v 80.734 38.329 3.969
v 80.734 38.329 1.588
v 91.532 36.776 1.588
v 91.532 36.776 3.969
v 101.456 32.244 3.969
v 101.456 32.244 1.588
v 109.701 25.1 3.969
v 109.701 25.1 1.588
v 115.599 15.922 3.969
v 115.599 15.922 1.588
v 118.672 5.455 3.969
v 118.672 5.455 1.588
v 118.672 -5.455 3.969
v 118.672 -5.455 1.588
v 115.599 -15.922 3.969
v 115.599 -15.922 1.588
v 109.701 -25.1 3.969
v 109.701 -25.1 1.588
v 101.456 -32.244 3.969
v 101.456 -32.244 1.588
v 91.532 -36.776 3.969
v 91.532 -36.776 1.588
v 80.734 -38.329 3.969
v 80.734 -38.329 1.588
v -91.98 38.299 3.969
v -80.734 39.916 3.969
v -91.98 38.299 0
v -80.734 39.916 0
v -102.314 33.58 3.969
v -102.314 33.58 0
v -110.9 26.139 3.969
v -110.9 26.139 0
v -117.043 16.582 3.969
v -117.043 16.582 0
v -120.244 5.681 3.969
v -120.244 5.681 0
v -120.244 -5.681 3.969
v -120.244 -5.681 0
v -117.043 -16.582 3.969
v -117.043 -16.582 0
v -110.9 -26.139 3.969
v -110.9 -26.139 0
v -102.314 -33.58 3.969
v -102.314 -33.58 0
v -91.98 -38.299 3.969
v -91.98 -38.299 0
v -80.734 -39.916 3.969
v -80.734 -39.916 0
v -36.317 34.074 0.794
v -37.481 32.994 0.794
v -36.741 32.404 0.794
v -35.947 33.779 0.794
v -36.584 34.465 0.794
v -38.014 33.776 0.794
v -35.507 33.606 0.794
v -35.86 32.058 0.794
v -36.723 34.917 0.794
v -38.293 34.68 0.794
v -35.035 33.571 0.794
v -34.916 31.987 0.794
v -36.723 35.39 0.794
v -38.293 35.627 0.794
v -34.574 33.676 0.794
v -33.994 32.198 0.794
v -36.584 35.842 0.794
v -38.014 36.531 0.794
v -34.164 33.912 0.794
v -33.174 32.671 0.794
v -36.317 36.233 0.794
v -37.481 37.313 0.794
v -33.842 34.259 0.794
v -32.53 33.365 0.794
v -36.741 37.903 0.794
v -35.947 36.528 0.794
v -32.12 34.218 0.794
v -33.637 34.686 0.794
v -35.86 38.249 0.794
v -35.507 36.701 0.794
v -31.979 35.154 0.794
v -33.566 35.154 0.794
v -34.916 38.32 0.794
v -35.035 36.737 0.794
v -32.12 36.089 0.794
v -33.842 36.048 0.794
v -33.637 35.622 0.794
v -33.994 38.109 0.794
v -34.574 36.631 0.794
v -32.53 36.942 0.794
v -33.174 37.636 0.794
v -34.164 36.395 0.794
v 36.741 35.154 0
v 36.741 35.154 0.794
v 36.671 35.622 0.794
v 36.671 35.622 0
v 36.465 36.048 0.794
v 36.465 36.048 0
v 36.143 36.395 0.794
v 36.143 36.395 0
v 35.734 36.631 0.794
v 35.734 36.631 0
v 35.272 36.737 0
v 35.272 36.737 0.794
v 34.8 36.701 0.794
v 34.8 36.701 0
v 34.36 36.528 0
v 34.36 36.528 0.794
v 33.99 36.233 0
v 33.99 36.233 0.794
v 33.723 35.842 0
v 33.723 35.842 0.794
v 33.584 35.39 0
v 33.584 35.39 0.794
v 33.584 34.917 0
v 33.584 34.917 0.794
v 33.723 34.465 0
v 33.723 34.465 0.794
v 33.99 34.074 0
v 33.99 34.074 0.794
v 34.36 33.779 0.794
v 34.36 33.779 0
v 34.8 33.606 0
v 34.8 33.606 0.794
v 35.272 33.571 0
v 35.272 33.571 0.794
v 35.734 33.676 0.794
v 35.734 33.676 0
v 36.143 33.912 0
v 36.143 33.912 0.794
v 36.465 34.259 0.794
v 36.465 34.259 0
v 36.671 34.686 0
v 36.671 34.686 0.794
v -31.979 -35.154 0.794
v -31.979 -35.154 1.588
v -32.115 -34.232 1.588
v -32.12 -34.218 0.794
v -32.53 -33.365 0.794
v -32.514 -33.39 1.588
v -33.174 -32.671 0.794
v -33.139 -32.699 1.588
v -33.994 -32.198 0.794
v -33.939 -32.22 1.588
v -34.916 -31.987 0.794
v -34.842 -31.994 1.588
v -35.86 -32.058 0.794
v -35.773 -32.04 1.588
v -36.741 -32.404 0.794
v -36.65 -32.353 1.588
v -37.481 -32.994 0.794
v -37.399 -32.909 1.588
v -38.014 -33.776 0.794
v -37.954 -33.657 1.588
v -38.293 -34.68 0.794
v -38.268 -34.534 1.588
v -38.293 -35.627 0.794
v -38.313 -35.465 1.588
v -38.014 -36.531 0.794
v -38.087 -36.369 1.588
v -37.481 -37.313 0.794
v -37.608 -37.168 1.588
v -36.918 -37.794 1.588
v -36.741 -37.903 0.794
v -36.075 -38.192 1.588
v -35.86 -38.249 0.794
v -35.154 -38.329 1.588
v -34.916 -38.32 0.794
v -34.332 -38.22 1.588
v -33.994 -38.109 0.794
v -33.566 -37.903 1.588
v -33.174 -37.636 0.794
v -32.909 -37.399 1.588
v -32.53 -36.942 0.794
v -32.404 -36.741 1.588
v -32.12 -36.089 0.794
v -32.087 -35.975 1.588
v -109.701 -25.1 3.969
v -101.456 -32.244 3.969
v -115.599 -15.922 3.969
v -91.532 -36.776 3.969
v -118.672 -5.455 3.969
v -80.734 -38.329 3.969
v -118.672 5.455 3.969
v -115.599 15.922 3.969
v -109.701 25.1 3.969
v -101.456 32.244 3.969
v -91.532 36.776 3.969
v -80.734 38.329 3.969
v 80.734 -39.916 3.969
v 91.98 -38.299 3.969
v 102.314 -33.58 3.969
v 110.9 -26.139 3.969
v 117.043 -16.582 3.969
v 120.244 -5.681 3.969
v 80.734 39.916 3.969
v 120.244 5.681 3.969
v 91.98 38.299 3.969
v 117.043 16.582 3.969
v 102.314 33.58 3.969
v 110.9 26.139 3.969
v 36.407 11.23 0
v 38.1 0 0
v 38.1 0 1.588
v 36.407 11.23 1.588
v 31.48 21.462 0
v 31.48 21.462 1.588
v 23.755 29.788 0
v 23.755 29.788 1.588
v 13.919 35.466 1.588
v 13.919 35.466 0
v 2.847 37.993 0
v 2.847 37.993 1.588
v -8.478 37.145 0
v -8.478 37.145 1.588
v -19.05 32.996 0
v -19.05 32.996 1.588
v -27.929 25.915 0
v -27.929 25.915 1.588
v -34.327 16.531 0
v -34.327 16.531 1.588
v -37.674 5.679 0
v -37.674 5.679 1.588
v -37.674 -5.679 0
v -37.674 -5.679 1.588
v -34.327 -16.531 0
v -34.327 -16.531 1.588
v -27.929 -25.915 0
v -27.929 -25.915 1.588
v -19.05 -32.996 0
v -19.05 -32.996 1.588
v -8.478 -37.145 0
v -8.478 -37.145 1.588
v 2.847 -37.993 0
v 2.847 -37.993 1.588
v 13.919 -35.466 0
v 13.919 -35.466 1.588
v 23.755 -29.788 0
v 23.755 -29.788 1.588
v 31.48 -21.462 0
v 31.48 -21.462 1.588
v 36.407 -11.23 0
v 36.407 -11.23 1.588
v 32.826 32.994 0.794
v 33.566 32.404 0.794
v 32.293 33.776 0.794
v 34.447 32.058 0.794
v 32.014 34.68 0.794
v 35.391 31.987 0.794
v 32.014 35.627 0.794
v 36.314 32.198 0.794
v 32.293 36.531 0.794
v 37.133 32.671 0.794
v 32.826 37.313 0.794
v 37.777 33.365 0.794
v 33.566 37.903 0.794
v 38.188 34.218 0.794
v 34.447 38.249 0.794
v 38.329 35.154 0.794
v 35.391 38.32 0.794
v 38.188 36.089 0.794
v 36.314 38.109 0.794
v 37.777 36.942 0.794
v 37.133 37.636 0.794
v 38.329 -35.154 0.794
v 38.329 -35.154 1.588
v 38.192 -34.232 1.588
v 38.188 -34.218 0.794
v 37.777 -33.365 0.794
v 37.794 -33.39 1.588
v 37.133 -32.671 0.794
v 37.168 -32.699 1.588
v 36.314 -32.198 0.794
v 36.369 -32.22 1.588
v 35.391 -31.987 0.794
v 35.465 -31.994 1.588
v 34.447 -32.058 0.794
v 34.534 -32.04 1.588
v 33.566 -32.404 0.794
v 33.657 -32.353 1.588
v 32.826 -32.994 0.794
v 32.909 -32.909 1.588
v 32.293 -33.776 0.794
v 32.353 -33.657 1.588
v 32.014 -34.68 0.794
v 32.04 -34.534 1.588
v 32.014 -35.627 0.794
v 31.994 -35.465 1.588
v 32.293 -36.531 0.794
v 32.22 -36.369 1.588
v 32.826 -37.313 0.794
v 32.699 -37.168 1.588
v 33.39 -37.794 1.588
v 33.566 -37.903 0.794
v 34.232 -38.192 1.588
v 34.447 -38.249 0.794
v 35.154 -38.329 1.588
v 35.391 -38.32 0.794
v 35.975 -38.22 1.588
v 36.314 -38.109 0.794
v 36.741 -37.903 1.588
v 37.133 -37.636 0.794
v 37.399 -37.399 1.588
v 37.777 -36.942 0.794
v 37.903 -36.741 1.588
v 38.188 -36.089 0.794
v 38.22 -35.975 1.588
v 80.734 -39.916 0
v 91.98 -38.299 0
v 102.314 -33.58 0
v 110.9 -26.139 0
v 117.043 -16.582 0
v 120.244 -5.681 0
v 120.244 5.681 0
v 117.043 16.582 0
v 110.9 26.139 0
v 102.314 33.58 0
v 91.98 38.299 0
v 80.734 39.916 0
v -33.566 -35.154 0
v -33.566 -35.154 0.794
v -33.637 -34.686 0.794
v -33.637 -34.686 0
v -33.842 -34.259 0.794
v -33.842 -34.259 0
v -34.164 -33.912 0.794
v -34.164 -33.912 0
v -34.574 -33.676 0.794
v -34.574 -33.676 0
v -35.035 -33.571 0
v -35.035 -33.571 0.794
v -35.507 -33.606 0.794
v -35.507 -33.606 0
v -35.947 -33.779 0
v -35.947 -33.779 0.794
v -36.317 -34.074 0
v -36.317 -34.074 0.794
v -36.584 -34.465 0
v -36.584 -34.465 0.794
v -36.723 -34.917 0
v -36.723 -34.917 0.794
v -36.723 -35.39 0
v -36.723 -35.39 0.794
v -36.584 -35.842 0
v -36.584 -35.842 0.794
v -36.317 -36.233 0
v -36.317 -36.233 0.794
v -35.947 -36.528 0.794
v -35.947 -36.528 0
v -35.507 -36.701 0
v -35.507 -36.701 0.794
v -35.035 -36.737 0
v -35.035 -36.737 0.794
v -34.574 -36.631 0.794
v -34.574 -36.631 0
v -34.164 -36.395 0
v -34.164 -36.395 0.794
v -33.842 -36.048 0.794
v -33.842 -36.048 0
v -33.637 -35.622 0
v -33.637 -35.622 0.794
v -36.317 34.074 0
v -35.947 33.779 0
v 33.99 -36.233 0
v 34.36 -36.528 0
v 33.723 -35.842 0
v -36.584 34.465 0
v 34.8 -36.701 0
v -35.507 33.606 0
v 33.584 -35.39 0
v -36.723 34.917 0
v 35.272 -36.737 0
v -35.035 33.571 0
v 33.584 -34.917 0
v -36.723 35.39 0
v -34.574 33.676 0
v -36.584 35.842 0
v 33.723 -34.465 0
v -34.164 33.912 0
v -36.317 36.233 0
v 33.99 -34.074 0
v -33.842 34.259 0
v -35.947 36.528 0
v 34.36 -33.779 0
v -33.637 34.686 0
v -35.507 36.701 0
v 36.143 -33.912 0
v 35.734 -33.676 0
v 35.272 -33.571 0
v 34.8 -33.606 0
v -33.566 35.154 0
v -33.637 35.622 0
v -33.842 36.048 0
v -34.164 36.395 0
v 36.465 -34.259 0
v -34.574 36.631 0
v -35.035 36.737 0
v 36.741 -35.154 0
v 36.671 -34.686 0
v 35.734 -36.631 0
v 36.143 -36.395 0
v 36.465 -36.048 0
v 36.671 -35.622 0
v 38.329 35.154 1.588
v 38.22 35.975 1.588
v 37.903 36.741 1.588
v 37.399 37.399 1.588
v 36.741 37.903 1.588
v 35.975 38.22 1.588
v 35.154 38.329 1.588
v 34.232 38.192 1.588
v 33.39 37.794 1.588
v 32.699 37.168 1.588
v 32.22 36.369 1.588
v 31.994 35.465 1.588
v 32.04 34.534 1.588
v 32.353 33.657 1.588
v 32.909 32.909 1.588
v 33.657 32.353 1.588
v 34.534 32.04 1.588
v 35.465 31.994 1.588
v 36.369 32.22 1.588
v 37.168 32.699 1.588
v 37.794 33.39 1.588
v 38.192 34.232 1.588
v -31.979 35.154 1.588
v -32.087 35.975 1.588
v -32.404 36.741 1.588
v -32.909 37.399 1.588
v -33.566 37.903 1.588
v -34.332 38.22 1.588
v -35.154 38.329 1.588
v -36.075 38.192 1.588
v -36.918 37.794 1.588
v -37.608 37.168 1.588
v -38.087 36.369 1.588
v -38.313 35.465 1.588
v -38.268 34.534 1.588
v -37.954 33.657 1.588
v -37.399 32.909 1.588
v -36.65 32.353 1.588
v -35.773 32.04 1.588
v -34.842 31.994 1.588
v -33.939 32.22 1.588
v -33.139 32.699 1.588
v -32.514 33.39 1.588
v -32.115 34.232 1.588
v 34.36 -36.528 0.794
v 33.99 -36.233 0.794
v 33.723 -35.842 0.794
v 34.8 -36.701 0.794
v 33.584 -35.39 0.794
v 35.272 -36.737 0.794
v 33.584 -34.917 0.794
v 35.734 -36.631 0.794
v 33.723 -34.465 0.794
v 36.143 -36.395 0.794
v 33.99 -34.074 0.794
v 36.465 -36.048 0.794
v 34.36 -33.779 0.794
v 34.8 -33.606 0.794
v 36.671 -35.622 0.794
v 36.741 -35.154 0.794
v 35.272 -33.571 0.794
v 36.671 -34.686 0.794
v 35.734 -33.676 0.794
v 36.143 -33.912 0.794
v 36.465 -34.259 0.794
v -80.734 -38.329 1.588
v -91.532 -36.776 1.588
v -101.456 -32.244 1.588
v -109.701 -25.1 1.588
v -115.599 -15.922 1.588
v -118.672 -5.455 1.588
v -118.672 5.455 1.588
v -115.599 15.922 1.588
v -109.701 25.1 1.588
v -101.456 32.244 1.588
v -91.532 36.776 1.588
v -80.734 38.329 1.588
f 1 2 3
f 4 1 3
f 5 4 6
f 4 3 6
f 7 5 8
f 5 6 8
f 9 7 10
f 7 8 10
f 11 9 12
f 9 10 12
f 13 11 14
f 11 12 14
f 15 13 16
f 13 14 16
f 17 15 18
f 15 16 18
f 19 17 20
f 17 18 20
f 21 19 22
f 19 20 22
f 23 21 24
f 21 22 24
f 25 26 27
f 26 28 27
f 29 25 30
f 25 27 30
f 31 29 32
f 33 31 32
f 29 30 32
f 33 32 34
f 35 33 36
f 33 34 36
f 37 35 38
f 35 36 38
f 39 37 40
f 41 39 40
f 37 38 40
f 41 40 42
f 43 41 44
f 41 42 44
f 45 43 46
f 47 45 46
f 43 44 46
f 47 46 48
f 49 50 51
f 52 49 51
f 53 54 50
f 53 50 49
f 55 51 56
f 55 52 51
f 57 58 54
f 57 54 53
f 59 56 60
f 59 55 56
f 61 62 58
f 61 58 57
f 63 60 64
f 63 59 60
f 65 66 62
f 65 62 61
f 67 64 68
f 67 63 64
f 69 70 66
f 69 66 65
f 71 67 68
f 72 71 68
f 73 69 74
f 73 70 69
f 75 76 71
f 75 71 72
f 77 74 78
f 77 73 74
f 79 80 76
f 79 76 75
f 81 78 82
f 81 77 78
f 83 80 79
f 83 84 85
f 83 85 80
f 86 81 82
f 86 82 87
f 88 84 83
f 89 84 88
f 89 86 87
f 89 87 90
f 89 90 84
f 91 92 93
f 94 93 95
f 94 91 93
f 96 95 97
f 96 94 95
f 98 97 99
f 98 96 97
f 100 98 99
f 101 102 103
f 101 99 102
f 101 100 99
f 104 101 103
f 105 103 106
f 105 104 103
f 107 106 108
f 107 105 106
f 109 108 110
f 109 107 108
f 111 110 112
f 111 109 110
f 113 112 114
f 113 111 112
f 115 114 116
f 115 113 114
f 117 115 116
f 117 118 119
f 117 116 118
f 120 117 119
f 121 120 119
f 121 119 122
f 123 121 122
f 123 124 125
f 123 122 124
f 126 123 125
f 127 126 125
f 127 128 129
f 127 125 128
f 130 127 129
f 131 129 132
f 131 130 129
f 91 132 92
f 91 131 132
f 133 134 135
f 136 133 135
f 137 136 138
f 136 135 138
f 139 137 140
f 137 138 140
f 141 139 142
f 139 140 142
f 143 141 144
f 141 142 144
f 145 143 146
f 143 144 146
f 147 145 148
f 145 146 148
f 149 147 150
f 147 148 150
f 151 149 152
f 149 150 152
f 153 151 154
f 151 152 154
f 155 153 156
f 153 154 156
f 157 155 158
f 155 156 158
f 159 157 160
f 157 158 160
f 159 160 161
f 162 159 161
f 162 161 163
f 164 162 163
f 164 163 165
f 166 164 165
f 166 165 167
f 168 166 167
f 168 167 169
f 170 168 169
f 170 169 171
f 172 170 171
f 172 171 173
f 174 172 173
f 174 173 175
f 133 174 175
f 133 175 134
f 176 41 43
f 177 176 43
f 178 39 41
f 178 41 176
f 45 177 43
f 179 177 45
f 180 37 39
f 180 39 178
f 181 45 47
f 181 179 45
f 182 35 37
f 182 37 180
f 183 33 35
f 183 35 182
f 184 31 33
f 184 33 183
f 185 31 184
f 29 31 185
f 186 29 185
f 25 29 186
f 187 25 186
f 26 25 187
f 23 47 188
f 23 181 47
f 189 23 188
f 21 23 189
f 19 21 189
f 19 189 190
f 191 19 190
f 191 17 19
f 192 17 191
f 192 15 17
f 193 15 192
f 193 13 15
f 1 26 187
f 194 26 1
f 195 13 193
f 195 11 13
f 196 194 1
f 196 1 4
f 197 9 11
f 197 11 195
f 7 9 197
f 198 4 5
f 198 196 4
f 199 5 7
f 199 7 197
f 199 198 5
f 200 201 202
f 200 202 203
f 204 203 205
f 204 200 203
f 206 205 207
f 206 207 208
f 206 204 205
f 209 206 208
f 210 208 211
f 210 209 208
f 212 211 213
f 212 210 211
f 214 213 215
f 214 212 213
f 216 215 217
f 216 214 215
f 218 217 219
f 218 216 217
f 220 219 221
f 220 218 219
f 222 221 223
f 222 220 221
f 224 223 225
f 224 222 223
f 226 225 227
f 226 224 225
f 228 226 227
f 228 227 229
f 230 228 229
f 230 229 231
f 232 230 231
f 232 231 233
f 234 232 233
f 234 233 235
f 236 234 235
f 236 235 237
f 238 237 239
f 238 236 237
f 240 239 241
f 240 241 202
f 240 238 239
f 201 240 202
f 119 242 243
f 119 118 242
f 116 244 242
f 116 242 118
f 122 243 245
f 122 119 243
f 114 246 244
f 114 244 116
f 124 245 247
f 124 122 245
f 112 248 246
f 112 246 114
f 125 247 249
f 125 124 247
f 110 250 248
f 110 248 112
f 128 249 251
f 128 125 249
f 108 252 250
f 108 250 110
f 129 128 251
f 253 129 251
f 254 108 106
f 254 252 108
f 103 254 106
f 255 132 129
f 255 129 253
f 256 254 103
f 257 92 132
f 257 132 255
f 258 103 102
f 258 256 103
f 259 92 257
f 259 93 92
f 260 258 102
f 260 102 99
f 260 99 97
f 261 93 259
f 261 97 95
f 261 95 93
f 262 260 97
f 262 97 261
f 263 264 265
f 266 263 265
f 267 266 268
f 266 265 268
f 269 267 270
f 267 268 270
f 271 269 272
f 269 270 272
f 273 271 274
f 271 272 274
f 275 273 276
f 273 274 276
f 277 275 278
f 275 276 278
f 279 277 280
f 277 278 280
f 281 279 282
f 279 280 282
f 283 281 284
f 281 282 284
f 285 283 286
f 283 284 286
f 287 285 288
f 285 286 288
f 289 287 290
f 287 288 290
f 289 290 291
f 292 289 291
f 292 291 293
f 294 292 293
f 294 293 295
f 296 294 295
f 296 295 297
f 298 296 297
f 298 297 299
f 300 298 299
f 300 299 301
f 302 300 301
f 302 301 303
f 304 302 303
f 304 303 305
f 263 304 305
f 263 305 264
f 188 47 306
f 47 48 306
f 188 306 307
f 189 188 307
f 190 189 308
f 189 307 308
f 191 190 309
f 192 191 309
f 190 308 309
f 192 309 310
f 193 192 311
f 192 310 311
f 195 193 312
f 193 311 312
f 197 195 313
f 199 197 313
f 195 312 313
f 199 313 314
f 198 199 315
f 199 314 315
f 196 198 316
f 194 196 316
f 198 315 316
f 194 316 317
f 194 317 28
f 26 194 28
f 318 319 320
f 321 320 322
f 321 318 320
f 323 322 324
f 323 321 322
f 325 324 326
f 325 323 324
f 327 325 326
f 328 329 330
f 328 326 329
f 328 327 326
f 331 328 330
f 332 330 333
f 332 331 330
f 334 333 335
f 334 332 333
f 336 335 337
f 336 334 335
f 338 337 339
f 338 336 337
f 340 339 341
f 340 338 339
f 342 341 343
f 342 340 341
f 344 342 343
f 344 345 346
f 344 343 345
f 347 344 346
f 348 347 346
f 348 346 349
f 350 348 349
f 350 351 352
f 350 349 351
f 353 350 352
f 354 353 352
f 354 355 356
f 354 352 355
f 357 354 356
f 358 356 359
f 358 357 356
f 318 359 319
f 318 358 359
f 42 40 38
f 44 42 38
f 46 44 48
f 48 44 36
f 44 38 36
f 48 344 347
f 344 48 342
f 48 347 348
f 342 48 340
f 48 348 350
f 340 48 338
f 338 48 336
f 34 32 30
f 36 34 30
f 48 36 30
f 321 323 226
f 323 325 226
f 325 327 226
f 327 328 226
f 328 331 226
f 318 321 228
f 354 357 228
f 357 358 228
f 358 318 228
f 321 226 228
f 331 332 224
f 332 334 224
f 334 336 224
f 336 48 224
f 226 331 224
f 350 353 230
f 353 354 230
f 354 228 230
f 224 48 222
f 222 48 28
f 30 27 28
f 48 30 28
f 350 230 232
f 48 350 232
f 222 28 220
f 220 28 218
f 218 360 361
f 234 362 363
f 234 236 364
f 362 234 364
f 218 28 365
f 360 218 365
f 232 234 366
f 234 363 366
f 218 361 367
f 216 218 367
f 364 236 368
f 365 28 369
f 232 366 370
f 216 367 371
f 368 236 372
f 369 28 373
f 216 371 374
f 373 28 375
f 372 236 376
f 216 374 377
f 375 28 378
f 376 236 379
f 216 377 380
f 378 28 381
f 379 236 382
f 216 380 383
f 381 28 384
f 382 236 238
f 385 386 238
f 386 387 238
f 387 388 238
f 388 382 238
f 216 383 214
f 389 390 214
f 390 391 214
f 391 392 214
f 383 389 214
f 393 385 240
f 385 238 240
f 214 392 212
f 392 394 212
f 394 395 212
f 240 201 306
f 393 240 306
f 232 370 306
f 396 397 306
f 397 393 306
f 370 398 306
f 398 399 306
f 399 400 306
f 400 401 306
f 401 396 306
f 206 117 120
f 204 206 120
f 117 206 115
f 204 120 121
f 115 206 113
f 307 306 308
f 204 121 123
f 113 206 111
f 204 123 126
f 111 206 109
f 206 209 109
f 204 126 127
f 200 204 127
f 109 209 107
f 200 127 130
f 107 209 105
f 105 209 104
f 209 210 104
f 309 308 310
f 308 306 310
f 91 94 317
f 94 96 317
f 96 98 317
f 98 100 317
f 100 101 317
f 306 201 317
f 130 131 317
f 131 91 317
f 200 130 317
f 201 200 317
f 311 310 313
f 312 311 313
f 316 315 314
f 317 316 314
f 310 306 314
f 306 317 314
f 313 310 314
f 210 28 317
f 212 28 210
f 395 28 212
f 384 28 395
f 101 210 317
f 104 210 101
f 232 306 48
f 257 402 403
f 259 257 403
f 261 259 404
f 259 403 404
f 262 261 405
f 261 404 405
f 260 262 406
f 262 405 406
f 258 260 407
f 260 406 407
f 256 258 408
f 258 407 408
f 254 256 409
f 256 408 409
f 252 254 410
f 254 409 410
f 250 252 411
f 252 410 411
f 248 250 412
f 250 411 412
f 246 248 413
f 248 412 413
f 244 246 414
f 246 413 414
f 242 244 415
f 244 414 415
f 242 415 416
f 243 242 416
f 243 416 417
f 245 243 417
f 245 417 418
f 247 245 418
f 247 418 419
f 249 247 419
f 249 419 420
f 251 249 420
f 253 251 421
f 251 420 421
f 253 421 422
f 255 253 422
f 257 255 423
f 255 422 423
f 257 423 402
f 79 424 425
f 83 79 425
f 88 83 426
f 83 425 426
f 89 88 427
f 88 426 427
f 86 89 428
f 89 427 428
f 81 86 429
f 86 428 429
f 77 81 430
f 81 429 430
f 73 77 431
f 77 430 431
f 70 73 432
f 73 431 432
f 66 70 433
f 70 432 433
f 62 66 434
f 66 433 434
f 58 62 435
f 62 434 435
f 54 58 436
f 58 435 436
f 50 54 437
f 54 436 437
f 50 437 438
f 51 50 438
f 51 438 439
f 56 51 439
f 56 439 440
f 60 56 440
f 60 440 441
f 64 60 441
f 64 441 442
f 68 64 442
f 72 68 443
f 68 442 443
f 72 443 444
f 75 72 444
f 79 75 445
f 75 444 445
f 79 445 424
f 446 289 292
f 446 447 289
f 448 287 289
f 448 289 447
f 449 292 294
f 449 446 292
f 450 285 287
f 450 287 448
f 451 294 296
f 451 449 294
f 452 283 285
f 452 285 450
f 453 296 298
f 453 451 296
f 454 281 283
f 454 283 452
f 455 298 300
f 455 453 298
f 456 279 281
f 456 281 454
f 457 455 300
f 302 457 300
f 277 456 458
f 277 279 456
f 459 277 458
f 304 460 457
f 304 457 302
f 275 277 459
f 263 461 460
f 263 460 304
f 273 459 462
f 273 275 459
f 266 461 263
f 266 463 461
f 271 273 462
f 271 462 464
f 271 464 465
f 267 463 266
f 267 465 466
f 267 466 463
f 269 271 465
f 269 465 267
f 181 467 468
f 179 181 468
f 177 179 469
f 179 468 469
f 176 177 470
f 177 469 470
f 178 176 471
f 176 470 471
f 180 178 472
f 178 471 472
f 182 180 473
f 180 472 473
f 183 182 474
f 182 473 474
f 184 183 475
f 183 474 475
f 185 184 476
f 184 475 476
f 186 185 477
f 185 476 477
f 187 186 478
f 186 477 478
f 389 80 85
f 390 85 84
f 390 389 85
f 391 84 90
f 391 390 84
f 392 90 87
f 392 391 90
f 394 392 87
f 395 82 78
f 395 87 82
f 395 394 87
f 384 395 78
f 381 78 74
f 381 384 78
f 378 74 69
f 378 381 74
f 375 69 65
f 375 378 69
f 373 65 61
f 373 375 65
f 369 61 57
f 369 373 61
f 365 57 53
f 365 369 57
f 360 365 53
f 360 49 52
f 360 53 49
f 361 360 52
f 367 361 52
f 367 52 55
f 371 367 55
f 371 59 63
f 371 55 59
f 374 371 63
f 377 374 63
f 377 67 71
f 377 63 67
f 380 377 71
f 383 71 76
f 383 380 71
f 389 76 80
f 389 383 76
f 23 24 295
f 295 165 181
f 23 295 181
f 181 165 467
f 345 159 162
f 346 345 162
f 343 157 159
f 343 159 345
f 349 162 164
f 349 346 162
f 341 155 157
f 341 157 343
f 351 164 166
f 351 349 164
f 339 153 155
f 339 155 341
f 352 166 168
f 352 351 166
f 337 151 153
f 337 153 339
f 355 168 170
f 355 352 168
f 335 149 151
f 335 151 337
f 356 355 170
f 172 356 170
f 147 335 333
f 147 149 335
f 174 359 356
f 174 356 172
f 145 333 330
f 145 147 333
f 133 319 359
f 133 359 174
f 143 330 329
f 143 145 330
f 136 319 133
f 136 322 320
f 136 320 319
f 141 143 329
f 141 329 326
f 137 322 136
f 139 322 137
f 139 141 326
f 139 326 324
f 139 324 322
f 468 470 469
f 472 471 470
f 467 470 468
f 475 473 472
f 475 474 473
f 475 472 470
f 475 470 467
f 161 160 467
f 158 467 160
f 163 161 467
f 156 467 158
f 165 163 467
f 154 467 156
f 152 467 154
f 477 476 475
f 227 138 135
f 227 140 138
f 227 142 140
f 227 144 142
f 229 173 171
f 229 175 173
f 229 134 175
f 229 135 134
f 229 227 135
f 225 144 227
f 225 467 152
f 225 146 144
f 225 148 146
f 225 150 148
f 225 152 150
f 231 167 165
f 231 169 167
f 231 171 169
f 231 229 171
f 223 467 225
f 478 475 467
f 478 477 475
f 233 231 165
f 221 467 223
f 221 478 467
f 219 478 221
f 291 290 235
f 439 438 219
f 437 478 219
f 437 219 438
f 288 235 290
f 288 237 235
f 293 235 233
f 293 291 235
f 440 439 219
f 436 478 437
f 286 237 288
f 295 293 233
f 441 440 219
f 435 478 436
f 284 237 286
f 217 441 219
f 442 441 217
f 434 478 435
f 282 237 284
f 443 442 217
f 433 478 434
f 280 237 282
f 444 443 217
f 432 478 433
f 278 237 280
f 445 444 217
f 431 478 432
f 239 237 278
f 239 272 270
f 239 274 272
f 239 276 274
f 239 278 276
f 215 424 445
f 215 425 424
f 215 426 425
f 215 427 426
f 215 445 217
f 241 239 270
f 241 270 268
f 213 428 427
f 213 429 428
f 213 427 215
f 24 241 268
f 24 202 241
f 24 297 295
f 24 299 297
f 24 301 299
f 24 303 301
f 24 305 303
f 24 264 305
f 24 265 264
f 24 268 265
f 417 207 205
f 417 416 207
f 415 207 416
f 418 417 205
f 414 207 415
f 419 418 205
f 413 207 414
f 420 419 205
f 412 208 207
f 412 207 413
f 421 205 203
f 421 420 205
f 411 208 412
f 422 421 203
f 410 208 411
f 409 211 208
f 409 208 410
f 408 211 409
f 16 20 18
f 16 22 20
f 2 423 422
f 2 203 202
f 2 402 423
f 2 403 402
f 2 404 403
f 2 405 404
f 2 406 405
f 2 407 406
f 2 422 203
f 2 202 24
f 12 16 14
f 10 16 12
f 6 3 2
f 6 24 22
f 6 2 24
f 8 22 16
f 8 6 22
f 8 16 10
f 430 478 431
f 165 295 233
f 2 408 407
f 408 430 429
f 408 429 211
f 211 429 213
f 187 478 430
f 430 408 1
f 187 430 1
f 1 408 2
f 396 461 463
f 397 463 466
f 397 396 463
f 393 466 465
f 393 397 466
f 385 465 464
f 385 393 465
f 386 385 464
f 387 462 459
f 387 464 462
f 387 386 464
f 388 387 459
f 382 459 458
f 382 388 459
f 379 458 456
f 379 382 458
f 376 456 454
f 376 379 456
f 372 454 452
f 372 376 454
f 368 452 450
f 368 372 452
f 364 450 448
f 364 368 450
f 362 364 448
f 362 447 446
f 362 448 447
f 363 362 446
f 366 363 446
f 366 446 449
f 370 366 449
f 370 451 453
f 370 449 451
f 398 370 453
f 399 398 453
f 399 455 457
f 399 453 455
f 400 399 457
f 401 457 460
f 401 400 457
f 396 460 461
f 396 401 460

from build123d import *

# Parameters (mm, degrees)
F0_R     = 1.5875
F0_R_2   = 38.1
F1_DEPTH = 1.5875
F3_DEPTH = 2.38125
F4_R     = 3.175
F5_DEPTH = 0.79375


with BuildPart() as f1:
    # F0 (on Top) → F1 (new body)
    with BuildSketch(Plane.XY):
        with BuildLine():
            ThreePointArc((80.7339, -39.9161), (120.65, 0), (80.7339, 39.9161))
            Line((80.7339, 39.9161), (-80.7339, 39.9161))
            ThreePointArc((-80.7339, 39.9161), (-120.65, 0), (-80.7339, -39.9161))
            Line((-80.7339, -39.9161), (80.7339, -39.9161))
        make_face()
        with Locations((-35.1536, -35.1536)):
            Circle(F0_R, mode=Mode.SUBTRACT)
        with Locations((35.1536, -35.1536)):
            Circle(F0_R, mode=Mode.SUBTRACT)
        with Locations((-35.1536, 35.1536)):
            Circle(F0_R, mode=Mode.SUBTRACT)
        Circle(F0_R_2, mode=Mode.SUBTRACT)
        with Locations((35.1536, 35.1536)):
            Circle(F0_R, mode=Mode.SUBTRACT)
    extrude(amount=F1_DEPTH)

    # F2 (on face) → F3 (join)
    with BuildSketch(Plane.XY.offset(1.5875)):
        with BuildLine():
            Line((80.7339, 39.9161), (-80.7339, 39.9161))
            ThreePointArc((-80.7339, 39.9161), (-120.65, 0), (-80.7339, -39.9161))
            Line((-80.7339, -39.9161), (80.7339, -39.9161))
            ThreePointArc((80.7339, -39.9161), (120.65, 0), (80.7339, 39.9161))
        make_face()
        with BuildLine():
            ThreePointArc((80.7339, 38.3286), (119.0625, 0), (80.7339, -38.3286))
            Line((80.7339, -38.3286), (-80.7339, -38.3286))
            ThreePointArc((-80.7339, -38.3286), (-119.0625, 0), (-80.7339, 38.3286))
            Line((-80.7339, 38.3286), (80.7339, 38.3286))
        make_face(mode=Mode.SUBTRACT)
    extrude(amount=F3_DEPTH)

    # F4 (on face) → F5 (cut)
    with BuildSketch(Plane.XY.offset(1.5875)):
        with Locations((-35.1536, 35.1536)):
            Circle(F4_R)
        with Locations((35.1536, 35.1536)):
            Circle(F4_R)
        with Locations((35.1536, -35.1536)):
            Circle(F4_R)
        with Locations((-35.1536, -35.1536)):
            Circle(F4_R)
    extrude(amount=-F5_DEPTH, mode=Mode.SUBTRACT)


solid = f1.part
